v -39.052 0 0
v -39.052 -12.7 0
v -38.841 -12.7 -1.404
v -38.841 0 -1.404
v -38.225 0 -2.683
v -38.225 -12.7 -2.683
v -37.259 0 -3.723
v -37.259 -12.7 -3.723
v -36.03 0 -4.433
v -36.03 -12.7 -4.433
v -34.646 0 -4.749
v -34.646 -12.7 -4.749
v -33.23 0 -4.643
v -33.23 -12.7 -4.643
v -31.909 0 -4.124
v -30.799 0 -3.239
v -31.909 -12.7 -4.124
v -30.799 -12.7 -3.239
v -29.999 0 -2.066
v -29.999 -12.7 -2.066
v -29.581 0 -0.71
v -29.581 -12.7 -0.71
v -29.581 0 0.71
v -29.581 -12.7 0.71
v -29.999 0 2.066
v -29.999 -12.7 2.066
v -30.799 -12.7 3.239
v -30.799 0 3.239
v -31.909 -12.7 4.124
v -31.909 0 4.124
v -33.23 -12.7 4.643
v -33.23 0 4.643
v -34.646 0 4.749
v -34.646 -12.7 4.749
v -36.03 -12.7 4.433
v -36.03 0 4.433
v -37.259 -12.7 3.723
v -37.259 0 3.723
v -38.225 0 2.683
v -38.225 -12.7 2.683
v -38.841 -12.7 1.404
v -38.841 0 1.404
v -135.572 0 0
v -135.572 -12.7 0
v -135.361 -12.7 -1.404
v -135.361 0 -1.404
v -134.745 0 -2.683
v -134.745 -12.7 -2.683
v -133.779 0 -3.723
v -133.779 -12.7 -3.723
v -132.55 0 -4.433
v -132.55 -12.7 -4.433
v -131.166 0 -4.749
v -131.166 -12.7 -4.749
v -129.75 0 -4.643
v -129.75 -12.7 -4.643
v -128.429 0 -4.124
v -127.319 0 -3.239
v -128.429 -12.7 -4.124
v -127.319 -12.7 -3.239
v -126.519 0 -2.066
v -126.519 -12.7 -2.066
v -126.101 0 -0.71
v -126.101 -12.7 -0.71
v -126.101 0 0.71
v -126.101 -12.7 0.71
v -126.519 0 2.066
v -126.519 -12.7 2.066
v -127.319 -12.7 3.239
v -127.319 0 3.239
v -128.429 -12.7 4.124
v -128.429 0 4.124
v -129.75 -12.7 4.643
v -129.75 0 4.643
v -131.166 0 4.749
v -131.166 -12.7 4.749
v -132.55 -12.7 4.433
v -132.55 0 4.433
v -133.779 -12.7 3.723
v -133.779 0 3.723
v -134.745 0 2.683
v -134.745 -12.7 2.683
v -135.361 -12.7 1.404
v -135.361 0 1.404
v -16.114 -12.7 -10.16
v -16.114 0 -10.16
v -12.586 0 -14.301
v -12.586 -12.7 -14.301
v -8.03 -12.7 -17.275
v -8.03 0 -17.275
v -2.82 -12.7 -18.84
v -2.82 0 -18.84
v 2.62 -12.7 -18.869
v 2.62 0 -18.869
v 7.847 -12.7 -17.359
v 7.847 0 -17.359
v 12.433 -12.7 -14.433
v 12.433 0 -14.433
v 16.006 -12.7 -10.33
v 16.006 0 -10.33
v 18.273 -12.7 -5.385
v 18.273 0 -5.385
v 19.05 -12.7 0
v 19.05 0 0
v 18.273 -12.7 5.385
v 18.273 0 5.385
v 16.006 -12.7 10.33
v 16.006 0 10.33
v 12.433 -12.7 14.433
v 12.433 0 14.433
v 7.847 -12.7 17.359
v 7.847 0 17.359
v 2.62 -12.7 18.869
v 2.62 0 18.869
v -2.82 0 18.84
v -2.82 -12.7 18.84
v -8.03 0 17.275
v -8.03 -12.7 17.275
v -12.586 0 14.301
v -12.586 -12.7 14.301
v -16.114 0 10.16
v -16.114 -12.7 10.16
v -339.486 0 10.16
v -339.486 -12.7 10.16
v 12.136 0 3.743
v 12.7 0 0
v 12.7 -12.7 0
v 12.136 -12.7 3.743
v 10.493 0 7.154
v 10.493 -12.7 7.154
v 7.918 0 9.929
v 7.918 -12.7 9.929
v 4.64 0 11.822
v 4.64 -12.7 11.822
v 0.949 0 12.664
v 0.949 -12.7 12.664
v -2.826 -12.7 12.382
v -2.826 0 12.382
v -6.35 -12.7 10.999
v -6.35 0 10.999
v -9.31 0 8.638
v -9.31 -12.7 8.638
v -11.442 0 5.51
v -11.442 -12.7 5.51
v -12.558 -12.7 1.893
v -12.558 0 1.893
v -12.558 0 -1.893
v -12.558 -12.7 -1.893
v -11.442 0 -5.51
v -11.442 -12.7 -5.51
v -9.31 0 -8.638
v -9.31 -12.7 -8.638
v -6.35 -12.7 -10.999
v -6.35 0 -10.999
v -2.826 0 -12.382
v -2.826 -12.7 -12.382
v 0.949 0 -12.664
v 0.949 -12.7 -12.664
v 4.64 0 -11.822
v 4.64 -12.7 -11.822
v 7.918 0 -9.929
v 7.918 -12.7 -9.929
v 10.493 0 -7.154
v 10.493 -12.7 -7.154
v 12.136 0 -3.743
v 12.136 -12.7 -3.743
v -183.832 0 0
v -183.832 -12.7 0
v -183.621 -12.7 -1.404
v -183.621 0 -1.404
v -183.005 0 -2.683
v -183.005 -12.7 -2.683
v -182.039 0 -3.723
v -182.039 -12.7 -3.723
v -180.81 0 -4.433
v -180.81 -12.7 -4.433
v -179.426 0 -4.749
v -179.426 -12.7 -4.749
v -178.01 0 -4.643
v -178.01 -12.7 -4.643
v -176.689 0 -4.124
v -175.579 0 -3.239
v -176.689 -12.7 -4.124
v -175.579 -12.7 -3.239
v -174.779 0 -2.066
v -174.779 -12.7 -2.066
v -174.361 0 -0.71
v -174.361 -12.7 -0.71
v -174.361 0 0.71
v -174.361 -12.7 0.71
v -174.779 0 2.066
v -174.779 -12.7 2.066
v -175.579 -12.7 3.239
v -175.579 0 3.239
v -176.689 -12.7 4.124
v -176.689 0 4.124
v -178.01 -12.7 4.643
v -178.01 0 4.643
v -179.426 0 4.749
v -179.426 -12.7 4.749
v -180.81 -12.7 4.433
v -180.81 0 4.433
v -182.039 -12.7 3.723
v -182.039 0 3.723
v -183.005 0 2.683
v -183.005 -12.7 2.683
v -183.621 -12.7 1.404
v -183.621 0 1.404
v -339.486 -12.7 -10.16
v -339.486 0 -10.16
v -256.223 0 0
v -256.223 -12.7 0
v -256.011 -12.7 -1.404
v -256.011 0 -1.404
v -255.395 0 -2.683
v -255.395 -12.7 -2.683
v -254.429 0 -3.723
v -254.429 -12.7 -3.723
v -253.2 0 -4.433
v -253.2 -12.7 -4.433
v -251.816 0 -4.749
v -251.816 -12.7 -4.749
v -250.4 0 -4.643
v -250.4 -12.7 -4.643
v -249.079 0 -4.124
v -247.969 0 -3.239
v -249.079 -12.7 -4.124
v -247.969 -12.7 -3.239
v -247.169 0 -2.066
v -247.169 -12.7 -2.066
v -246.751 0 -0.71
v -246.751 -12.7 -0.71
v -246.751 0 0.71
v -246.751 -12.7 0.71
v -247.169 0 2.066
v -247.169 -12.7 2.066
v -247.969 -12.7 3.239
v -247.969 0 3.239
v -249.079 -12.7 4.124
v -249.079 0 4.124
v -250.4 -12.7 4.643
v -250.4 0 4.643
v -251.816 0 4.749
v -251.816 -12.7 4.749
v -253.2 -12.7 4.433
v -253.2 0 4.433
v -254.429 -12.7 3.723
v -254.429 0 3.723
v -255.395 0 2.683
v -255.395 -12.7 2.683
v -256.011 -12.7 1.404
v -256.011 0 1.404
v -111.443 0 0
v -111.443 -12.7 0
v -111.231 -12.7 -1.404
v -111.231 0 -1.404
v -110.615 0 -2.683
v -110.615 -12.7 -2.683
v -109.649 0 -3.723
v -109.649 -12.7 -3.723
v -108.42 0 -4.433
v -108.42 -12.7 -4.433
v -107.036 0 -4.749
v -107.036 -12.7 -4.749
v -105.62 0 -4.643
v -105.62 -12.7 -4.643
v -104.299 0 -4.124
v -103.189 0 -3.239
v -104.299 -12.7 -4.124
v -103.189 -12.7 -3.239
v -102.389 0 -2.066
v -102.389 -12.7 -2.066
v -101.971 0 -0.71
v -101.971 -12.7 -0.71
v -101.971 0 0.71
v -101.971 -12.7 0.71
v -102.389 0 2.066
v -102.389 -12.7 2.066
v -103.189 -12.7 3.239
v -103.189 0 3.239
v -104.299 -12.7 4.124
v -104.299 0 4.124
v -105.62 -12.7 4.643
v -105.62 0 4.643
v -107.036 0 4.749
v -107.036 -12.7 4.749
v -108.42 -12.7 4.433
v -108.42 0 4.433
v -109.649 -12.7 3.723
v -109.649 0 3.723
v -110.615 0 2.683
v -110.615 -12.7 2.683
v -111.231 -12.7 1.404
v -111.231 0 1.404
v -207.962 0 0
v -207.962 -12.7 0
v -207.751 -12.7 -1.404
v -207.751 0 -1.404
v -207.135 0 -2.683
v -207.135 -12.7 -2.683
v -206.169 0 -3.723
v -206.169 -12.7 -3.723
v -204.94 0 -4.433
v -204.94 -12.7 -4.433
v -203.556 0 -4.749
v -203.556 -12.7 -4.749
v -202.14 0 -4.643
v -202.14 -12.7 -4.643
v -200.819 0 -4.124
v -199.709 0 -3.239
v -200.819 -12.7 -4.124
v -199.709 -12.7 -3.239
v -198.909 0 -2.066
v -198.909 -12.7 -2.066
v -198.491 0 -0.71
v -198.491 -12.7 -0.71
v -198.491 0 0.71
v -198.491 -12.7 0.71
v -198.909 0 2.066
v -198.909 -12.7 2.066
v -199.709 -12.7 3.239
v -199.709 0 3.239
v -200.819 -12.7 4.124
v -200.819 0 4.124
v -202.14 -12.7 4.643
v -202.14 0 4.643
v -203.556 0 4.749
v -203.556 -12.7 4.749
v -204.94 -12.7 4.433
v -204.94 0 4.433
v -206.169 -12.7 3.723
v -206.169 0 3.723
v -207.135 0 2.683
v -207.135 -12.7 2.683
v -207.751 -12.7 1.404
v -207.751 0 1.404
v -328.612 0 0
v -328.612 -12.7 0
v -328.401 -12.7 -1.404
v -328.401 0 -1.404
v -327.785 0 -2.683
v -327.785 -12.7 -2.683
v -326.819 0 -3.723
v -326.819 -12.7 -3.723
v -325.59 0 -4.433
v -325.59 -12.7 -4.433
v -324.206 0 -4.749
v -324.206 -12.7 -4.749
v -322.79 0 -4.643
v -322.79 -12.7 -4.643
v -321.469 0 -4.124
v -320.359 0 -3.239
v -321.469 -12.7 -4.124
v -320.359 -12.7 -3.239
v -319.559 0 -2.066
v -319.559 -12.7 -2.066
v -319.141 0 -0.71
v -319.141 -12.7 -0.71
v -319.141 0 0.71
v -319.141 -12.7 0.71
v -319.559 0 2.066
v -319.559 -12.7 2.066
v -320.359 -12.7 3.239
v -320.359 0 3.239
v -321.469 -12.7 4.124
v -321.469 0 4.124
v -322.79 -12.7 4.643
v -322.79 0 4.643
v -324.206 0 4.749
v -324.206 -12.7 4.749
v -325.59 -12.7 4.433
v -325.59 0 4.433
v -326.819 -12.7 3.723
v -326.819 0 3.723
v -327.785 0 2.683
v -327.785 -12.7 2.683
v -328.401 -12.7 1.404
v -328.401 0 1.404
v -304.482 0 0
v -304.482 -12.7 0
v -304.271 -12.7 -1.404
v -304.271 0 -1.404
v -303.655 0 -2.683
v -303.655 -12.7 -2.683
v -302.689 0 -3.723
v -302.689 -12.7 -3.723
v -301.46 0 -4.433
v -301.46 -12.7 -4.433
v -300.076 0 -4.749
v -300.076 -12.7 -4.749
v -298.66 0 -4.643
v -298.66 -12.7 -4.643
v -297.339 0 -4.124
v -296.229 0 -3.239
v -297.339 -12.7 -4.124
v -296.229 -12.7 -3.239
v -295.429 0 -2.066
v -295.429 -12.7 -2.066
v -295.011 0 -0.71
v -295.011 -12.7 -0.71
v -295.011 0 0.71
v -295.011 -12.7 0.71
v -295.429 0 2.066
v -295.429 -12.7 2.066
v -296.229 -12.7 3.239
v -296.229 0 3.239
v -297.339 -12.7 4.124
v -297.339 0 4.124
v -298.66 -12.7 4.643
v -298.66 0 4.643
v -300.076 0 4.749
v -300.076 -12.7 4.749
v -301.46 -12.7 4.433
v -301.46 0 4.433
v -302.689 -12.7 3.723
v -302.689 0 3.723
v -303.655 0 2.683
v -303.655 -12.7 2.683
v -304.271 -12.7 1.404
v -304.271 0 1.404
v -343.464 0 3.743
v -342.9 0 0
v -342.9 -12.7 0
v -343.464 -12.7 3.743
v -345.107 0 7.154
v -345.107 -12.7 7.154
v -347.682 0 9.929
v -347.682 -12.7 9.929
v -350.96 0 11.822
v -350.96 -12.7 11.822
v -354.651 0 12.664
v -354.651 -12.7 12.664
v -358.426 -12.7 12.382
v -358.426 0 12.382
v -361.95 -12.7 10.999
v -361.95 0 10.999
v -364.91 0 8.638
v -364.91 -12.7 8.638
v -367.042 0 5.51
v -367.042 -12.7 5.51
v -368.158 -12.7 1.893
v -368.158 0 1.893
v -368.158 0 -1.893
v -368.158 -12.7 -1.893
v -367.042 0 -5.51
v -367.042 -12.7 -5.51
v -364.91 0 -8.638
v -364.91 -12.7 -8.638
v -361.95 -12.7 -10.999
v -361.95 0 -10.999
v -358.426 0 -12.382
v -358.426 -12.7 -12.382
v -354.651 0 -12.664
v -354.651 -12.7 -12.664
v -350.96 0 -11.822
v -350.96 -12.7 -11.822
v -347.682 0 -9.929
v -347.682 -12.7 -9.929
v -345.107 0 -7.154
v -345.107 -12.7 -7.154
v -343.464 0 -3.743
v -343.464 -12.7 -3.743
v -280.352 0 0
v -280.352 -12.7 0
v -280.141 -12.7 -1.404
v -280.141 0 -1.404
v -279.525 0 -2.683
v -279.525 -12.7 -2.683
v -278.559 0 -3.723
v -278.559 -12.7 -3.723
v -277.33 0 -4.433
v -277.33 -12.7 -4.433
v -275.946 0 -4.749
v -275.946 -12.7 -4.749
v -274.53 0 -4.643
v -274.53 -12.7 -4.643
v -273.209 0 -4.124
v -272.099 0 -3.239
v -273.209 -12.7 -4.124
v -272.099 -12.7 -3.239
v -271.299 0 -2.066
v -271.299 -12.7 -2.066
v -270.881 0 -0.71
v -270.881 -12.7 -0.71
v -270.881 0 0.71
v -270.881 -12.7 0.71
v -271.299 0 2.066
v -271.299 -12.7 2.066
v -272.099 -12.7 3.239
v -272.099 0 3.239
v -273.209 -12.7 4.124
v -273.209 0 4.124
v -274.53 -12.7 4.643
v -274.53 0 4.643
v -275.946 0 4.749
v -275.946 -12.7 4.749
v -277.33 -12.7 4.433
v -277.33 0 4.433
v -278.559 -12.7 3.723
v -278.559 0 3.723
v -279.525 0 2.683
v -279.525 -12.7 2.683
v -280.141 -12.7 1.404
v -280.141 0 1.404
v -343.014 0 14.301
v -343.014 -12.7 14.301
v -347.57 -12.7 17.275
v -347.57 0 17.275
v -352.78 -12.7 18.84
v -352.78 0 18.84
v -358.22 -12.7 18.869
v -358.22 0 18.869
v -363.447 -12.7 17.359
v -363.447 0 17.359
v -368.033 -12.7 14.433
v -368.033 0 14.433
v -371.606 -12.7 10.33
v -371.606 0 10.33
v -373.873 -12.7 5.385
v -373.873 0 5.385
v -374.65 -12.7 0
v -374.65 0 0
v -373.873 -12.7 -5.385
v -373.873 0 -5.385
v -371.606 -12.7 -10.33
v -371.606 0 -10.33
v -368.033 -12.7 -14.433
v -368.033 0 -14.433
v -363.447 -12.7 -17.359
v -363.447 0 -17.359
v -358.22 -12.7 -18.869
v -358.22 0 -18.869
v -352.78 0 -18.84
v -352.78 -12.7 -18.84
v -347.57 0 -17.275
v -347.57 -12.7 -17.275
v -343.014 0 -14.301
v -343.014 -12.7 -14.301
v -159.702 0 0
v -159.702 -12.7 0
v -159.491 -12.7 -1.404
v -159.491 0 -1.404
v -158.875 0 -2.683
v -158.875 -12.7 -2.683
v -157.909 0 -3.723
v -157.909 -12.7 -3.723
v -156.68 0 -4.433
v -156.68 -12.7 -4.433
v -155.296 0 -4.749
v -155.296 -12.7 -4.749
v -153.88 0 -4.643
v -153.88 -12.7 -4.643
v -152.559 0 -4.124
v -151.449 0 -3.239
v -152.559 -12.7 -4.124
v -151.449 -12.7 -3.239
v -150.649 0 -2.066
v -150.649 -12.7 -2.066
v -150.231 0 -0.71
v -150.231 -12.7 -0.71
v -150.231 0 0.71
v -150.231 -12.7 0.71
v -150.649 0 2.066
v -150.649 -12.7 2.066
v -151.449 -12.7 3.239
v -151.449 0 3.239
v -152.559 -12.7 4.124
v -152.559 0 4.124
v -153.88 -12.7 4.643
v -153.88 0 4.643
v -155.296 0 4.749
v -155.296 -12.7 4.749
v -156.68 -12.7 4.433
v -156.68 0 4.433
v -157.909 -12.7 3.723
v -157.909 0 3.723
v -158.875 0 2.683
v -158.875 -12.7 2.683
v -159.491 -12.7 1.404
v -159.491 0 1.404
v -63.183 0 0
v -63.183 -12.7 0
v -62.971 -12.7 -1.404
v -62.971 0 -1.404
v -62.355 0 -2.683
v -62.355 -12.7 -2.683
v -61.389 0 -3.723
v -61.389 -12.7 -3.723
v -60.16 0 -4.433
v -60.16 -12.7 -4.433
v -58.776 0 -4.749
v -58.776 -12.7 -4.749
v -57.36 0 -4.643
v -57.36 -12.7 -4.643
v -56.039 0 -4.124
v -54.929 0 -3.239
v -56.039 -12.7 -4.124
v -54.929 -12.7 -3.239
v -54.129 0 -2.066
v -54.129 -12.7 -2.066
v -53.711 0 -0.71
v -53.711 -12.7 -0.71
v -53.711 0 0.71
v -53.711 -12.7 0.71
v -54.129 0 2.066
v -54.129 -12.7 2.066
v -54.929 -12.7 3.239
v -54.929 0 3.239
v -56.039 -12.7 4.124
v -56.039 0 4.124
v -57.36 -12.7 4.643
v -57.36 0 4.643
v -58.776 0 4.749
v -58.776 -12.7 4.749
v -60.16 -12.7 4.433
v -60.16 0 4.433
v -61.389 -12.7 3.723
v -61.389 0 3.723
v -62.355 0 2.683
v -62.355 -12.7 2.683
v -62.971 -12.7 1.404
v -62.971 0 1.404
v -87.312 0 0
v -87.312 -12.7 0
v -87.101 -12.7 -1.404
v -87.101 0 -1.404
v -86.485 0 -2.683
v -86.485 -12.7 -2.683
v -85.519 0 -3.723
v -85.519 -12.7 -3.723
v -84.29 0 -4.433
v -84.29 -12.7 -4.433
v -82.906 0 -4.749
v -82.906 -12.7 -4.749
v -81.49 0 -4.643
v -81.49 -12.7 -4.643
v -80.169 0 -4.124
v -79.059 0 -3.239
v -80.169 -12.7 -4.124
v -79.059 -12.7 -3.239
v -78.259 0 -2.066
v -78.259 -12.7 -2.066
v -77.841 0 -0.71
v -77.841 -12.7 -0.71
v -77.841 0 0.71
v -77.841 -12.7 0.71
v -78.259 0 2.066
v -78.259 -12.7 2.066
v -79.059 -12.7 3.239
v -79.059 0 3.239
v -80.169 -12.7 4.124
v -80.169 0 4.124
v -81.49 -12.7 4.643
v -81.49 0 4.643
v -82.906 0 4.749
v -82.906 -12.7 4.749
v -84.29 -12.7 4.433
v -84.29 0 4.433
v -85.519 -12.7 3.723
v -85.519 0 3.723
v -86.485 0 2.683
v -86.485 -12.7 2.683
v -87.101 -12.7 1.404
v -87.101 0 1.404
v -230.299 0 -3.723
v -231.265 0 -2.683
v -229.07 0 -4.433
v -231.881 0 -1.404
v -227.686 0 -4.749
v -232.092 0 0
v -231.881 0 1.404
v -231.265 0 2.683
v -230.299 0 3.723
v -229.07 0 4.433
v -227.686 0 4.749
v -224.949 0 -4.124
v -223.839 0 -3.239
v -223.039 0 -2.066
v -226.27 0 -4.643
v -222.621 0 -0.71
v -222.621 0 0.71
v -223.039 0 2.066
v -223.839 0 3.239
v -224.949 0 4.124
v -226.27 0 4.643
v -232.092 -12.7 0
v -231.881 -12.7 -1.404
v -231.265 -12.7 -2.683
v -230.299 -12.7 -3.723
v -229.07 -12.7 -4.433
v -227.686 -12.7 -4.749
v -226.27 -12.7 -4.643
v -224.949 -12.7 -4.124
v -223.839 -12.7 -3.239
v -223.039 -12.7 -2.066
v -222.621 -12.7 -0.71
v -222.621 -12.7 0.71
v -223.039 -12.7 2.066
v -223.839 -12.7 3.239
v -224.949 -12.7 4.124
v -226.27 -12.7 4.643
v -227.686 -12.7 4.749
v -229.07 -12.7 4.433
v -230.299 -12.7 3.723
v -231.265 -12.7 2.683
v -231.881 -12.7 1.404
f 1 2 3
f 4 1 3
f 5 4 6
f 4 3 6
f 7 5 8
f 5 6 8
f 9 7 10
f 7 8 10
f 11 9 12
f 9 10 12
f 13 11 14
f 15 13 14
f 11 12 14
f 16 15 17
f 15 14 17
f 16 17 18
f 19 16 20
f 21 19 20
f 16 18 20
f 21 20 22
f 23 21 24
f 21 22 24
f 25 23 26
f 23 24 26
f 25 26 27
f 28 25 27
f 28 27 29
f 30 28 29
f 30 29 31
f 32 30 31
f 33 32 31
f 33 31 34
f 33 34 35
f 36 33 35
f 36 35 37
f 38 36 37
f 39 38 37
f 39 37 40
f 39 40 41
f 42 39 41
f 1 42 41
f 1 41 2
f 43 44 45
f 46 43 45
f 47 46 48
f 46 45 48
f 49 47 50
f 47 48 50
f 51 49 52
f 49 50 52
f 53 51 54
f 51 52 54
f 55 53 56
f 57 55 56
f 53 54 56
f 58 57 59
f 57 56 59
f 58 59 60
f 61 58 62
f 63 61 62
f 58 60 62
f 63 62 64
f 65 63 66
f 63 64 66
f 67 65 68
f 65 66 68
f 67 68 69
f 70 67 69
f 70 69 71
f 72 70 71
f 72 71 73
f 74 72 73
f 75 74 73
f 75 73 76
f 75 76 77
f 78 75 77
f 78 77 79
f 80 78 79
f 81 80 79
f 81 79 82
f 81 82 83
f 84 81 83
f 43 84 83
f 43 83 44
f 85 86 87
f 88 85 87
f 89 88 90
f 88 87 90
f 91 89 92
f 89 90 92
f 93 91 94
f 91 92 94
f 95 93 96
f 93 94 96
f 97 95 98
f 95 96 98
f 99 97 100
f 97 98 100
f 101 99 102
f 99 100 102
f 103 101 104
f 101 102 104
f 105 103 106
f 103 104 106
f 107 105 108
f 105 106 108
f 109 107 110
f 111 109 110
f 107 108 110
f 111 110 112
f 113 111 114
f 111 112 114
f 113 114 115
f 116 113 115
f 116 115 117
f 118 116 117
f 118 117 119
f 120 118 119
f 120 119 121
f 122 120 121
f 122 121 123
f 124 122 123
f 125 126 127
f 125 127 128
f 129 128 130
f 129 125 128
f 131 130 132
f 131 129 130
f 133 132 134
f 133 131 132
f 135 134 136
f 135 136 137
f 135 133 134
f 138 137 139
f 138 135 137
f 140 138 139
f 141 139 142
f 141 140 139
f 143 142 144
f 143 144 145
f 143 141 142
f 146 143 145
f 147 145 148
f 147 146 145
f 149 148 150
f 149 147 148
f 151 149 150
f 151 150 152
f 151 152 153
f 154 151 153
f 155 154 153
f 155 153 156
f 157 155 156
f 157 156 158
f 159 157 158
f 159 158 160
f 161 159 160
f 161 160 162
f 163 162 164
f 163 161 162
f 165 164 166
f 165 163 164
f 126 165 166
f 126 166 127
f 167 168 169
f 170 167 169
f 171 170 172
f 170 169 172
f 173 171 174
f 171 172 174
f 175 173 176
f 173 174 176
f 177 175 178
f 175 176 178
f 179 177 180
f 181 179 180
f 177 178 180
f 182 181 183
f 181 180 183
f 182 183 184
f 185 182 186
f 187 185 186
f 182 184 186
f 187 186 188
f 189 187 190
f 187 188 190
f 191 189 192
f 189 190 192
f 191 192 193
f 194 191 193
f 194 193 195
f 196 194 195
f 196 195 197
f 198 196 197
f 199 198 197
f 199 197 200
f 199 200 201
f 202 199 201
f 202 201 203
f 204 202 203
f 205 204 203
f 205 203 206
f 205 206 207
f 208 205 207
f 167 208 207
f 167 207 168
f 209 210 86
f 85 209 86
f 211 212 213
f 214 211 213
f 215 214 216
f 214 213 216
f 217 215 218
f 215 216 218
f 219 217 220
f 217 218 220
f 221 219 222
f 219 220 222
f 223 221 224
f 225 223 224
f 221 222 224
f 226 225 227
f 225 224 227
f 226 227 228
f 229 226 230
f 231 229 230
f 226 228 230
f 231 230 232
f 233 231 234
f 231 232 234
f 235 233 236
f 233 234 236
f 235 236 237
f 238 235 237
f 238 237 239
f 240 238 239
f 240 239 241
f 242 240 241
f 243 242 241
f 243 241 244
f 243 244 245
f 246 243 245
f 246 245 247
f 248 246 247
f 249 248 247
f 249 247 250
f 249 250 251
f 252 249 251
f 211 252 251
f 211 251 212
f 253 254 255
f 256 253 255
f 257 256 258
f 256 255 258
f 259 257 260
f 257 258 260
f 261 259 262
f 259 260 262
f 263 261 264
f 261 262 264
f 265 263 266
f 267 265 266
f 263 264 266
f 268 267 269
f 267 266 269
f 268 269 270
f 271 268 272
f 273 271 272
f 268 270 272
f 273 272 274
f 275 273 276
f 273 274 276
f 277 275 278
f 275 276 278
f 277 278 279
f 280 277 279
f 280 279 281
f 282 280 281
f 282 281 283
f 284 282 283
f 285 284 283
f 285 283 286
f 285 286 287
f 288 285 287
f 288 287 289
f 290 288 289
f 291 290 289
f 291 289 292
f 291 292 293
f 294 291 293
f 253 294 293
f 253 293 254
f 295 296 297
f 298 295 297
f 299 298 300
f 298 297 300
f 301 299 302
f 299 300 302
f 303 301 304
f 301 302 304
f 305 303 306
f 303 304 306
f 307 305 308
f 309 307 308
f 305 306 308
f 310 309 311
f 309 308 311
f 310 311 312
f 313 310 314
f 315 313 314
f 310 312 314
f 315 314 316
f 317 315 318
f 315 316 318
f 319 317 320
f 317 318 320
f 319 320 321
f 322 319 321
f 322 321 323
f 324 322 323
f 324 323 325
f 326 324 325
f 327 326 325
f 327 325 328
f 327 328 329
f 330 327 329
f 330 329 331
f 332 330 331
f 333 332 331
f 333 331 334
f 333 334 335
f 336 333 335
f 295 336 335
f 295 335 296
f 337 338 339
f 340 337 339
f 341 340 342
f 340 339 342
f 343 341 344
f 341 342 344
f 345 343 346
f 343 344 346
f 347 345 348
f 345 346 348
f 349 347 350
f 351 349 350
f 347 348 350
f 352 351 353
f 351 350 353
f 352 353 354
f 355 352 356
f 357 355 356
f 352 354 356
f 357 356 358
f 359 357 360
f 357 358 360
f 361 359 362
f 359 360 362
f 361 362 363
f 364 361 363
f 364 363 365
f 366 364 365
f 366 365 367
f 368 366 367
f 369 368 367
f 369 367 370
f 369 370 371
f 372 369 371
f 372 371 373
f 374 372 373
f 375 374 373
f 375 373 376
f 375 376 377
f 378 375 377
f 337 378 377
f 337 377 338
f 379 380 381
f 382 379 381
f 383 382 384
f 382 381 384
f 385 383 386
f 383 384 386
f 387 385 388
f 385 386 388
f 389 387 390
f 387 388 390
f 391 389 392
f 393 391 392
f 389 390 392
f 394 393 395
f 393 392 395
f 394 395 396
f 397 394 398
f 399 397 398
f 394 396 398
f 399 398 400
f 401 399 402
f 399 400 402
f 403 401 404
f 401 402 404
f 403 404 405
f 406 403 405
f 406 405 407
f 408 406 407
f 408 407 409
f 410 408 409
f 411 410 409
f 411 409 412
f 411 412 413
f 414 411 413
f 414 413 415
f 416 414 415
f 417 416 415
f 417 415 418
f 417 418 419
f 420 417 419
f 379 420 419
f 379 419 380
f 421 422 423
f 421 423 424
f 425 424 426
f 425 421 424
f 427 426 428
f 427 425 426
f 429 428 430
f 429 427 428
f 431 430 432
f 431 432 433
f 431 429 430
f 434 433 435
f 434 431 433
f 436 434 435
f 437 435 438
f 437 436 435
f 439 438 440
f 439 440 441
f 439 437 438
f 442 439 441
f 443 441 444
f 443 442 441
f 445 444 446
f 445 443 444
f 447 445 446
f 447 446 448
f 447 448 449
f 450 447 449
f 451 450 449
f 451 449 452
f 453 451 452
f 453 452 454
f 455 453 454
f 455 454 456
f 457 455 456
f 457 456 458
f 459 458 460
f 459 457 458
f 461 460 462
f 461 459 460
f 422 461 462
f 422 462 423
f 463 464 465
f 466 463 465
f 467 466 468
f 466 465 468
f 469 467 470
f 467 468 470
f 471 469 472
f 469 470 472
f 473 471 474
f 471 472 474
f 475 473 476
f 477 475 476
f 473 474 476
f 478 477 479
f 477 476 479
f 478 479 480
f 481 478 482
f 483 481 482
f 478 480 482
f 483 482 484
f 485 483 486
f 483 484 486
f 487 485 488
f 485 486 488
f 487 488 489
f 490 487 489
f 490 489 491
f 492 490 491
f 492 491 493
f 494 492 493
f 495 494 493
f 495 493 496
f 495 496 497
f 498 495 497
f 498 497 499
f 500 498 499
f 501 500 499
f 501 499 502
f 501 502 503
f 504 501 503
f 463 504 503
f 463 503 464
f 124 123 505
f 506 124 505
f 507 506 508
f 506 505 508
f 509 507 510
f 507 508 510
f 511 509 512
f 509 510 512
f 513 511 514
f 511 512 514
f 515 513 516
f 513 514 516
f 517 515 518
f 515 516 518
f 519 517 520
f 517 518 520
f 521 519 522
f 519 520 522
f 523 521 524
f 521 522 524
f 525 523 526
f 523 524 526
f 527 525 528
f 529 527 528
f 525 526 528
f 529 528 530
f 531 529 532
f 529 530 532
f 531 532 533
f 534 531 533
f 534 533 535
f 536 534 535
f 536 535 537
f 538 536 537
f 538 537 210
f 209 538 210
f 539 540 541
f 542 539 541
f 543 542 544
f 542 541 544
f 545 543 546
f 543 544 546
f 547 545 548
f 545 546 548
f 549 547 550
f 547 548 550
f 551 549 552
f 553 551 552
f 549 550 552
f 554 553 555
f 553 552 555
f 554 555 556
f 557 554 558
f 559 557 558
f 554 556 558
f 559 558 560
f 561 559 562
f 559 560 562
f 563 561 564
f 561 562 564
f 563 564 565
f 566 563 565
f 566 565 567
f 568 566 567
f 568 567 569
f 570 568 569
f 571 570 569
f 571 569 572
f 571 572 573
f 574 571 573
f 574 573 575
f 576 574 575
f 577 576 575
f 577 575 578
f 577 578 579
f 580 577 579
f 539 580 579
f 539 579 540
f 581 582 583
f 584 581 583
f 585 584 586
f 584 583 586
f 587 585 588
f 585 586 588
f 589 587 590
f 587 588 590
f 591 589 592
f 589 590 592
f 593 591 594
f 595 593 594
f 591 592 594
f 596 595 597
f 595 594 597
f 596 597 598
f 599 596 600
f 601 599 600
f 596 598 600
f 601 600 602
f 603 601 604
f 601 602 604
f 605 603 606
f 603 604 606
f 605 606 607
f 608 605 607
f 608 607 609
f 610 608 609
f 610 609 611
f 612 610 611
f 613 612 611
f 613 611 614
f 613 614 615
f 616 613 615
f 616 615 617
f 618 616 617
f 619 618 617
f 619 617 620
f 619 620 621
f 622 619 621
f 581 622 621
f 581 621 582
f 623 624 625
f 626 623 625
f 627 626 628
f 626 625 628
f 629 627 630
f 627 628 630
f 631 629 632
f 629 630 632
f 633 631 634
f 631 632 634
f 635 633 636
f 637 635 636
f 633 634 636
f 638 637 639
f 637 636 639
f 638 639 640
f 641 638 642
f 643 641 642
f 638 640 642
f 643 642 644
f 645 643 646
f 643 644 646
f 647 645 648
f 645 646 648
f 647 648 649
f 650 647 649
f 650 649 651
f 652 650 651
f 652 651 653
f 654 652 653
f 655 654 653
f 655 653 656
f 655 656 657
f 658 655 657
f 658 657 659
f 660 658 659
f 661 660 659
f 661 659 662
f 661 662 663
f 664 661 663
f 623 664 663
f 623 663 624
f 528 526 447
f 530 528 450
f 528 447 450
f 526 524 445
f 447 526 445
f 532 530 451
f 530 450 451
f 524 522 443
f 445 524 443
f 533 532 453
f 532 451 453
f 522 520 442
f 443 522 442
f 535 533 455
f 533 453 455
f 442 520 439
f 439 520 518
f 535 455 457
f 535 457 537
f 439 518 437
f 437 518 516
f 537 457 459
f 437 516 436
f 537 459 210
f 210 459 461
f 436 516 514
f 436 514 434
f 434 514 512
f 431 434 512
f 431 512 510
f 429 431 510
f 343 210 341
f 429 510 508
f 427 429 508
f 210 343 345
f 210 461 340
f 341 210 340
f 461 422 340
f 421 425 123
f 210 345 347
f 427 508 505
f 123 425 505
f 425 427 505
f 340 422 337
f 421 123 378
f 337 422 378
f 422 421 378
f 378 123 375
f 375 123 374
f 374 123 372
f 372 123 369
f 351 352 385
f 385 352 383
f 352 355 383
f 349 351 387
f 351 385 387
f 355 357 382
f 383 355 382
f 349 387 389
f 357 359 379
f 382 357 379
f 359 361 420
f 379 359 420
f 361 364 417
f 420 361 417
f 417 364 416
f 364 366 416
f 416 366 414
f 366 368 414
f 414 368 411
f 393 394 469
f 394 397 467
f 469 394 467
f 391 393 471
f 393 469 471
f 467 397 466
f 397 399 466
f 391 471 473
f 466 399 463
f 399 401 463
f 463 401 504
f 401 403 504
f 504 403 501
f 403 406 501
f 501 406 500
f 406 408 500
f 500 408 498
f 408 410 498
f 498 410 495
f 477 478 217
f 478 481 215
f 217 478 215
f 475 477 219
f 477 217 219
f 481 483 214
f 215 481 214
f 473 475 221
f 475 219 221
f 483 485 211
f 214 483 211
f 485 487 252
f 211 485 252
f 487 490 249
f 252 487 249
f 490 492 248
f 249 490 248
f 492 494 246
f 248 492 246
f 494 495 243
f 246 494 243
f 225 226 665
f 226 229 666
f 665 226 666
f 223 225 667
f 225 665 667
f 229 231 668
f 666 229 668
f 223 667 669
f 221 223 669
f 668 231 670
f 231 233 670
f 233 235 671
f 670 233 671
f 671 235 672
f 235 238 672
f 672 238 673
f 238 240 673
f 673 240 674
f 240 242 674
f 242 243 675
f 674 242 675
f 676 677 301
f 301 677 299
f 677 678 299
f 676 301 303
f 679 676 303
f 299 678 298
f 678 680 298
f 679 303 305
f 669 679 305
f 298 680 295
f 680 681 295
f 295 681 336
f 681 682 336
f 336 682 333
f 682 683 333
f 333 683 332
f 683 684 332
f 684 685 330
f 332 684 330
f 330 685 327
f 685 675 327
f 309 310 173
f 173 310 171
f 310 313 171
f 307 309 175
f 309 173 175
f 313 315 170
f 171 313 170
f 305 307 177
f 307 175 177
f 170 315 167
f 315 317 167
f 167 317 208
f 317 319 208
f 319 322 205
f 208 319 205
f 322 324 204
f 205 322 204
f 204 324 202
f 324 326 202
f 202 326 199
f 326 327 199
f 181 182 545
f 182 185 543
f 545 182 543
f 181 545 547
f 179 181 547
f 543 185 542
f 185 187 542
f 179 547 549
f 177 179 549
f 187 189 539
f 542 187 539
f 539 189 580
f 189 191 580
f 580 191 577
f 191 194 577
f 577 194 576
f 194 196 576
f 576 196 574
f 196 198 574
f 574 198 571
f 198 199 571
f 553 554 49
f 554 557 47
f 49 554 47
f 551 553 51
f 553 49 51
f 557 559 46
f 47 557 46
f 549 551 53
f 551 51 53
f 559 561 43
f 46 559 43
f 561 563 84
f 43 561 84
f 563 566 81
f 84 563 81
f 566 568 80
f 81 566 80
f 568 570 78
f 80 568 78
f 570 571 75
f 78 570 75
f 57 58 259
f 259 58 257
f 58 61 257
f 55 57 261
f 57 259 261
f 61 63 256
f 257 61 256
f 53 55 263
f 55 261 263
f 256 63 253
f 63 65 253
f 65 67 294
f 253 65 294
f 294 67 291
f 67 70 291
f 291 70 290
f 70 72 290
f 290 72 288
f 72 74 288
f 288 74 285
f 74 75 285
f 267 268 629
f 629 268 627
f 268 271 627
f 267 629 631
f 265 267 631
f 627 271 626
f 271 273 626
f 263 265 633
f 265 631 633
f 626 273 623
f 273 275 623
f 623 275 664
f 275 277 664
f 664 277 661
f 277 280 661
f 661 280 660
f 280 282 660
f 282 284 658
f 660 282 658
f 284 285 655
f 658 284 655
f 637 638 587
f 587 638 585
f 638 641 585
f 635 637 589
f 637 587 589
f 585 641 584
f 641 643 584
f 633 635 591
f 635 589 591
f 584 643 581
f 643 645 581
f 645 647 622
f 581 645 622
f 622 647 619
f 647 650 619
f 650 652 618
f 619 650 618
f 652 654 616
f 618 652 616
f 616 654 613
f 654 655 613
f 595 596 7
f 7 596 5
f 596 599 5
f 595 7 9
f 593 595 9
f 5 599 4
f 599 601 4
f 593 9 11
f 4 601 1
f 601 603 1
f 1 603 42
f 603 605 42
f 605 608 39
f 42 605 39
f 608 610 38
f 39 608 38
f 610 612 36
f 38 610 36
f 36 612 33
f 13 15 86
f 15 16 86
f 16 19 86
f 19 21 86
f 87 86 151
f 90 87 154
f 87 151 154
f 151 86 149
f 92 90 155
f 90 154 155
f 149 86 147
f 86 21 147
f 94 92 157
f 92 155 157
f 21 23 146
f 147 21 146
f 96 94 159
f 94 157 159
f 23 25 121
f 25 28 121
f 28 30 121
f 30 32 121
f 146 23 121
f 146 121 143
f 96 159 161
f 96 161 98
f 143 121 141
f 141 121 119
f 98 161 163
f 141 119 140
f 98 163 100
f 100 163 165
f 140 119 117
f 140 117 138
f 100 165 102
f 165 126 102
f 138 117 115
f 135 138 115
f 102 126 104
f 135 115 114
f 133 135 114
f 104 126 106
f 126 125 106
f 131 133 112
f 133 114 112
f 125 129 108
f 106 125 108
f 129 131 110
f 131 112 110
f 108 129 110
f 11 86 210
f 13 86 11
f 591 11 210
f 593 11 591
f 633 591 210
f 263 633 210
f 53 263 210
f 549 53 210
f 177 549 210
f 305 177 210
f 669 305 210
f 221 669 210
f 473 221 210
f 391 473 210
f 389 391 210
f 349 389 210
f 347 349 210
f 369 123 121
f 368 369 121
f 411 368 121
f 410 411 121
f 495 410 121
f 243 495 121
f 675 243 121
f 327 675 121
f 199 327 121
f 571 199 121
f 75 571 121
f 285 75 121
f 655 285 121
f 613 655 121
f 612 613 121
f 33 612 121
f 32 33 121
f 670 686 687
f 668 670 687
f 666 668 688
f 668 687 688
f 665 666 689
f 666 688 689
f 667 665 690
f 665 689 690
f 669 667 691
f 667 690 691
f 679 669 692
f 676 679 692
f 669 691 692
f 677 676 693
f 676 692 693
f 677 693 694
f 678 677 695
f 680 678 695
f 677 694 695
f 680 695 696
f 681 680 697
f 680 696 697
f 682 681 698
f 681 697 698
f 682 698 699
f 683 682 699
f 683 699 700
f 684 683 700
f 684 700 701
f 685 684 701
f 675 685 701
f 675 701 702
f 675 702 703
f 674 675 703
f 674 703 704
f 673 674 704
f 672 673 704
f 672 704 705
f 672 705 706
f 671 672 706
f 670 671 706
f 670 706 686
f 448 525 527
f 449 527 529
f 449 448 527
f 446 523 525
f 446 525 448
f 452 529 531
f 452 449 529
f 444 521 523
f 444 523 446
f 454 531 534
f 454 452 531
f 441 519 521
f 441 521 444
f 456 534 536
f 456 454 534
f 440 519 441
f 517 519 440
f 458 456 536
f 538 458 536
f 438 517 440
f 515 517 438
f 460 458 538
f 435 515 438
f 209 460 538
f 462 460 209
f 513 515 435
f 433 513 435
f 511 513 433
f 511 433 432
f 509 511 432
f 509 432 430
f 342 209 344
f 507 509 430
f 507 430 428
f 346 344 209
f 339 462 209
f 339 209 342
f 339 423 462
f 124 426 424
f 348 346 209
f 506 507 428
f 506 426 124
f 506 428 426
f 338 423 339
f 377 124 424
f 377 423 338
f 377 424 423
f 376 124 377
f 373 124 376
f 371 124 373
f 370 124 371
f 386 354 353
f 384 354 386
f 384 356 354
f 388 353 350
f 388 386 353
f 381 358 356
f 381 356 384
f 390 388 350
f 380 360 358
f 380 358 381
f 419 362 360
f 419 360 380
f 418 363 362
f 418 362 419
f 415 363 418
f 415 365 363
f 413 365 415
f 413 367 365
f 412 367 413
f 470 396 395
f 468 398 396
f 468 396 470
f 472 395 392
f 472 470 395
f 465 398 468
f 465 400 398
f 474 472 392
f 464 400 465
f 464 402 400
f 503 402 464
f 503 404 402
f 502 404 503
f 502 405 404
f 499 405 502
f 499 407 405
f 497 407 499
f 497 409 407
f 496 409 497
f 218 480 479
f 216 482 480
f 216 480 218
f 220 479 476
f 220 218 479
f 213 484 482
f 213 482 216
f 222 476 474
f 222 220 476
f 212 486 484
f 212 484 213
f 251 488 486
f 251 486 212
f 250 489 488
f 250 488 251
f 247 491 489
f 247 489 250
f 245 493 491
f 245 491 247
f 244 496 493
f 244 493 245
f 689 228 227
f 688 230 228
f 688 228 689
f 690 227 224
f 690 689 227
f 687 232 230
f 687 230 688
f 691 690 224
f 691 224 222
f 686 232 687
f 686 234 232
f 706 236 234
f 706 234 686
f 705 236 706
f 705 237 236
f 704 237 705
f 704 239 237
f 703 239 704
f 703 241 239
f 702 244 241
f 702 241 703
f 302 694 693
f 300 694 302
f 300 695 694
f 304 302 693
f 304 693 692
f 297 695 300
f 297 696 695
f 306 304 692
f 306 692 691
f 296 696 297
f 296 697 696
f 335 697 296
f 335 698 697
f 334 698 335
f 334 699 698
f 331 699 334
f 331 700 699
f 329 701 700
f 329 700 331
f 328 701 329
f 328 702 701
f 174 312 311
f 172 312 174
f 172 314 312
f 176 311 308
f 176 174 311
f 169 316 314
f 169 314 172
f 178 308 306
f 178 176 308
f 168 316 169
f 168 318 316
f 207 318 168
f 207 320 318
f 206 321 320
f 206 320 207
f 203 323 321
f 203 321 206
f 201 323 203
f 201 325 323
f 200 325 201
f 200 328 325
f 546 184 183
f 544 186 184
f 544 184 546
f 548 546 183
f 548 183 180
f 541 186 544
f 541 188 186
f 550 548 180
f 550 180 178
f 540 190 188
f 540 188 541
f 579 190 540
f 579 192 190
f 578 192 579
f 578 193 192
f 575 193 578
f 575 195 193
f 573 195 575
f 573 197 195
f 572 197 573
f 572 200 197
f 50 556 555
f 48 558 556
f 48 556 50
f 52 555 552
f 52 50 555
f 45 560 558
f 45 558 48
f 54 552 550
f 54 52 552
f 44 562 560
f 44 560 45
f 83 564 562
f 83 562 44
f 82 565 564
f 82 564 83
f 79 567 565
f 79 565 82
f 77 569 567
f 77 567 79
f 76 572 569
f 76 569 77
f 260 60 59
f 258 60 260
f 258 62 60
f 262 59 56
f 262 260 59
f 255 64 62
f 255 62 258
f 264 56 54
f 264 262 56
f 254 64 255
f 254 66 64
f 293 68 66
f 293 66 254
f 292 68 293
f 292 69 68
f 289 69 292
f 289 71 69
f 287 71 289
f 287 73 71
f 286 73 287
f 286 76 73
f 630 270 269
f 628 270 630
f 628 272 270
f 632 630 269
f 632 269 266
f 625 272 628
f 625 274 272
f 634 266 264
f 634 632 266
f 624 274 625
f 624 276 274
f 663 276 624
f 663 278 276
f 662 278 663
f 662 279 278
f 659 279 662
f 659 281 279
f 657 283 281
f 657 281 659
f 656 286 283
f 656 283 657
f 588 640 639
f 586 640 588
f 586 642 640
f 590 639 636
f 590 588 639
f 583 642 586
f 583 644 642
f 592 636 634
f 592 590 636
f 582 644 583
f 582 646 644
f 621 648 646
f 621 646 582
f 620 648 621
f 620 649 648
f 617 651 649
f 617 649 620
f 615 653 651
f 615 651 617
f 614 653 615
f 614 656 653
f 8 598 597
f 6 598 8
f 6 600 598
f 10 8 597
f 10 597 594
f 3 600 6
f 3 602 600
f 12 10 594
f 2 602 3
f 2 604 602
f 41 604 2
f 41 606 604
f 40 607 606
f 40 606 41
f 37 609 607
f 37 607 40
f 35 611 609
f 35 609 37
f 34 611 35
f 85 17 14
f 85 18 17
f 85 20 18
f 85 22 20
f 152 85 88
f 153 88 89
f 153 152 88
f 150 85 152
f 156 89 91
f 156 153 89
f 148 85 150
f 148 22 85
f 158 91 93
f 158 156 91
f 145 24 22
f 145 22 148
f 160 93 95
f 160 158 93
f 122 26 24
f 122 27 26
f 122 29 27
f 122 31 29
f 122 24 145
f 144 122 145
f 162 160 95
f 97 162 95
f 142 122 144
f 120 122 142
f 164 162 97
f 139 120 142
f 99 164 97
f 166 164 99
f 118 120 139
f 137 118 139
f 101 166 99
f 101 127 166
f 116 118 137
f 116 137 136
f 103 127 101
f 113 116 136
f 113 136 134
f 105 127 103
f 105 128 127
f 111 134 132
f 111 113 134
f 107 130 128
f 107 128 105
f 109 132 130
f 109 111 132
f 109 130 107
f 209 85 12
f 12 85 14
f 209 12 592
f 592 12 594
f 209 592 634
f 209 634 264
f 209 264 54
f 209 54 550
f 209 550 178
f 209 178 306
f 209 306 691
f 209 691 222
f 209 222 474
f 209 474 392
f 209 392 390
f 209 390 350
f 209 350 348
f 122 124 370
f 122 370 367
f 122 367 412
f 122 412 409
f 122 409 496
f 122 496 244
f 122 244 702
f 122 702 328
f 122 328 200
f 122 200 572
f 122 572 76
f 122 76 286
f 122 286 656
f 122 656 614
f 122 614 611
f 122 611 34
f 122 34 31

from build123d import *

# Parameters (mm, degrees)
F0_R     = 12.7
F1_DEPTH = 12.7
F2_D     = 9.525


with BuildPart() as f1:
    # F0 (on Front) → F1 (new body)
    with BuildSketch(Plane.XZ):
        with BuildLine():
            Line((-339.485507, -10.16), (-16.114493, -10.16))
            ThreePointArc((-16.114493, -10.16), (19.05, 0), (-16.114493, 10.16))
            Line((-16.114493, 10.16), (-339.485507, 10.16))
            ThreePointArc((-339.485507, 10.16), (-374.65, 0), (-339.485507, -10.16))
        make_face()
        with Locations((-355.6, 0)):
            Circle(F0_R, mode=Mode.SUBTRACT)
        Circle(F0_R, mode=Mode.SUBTRACT)
    extrude(amount=F1_DEPTH)

    # F2 (through all)
    with Locations(Plane(origin=(0, 0, 0), x_dir=(1, 0, 0), z_dir=(0, 1, 0))):
        with Locations((-323.85, 0), (-299.72, 0), (-275.59, 0), (-251.46, 0), (-227.33, 0), (-203.2, 0), (-179.07, 0), (-154.94, 0), (-130.81, 0), (-106.68, 0), (-82.55, 0), (-58.42, 0), (-34.29, 0)):
            Hole(F2_D / 2)


solid = f1.part
